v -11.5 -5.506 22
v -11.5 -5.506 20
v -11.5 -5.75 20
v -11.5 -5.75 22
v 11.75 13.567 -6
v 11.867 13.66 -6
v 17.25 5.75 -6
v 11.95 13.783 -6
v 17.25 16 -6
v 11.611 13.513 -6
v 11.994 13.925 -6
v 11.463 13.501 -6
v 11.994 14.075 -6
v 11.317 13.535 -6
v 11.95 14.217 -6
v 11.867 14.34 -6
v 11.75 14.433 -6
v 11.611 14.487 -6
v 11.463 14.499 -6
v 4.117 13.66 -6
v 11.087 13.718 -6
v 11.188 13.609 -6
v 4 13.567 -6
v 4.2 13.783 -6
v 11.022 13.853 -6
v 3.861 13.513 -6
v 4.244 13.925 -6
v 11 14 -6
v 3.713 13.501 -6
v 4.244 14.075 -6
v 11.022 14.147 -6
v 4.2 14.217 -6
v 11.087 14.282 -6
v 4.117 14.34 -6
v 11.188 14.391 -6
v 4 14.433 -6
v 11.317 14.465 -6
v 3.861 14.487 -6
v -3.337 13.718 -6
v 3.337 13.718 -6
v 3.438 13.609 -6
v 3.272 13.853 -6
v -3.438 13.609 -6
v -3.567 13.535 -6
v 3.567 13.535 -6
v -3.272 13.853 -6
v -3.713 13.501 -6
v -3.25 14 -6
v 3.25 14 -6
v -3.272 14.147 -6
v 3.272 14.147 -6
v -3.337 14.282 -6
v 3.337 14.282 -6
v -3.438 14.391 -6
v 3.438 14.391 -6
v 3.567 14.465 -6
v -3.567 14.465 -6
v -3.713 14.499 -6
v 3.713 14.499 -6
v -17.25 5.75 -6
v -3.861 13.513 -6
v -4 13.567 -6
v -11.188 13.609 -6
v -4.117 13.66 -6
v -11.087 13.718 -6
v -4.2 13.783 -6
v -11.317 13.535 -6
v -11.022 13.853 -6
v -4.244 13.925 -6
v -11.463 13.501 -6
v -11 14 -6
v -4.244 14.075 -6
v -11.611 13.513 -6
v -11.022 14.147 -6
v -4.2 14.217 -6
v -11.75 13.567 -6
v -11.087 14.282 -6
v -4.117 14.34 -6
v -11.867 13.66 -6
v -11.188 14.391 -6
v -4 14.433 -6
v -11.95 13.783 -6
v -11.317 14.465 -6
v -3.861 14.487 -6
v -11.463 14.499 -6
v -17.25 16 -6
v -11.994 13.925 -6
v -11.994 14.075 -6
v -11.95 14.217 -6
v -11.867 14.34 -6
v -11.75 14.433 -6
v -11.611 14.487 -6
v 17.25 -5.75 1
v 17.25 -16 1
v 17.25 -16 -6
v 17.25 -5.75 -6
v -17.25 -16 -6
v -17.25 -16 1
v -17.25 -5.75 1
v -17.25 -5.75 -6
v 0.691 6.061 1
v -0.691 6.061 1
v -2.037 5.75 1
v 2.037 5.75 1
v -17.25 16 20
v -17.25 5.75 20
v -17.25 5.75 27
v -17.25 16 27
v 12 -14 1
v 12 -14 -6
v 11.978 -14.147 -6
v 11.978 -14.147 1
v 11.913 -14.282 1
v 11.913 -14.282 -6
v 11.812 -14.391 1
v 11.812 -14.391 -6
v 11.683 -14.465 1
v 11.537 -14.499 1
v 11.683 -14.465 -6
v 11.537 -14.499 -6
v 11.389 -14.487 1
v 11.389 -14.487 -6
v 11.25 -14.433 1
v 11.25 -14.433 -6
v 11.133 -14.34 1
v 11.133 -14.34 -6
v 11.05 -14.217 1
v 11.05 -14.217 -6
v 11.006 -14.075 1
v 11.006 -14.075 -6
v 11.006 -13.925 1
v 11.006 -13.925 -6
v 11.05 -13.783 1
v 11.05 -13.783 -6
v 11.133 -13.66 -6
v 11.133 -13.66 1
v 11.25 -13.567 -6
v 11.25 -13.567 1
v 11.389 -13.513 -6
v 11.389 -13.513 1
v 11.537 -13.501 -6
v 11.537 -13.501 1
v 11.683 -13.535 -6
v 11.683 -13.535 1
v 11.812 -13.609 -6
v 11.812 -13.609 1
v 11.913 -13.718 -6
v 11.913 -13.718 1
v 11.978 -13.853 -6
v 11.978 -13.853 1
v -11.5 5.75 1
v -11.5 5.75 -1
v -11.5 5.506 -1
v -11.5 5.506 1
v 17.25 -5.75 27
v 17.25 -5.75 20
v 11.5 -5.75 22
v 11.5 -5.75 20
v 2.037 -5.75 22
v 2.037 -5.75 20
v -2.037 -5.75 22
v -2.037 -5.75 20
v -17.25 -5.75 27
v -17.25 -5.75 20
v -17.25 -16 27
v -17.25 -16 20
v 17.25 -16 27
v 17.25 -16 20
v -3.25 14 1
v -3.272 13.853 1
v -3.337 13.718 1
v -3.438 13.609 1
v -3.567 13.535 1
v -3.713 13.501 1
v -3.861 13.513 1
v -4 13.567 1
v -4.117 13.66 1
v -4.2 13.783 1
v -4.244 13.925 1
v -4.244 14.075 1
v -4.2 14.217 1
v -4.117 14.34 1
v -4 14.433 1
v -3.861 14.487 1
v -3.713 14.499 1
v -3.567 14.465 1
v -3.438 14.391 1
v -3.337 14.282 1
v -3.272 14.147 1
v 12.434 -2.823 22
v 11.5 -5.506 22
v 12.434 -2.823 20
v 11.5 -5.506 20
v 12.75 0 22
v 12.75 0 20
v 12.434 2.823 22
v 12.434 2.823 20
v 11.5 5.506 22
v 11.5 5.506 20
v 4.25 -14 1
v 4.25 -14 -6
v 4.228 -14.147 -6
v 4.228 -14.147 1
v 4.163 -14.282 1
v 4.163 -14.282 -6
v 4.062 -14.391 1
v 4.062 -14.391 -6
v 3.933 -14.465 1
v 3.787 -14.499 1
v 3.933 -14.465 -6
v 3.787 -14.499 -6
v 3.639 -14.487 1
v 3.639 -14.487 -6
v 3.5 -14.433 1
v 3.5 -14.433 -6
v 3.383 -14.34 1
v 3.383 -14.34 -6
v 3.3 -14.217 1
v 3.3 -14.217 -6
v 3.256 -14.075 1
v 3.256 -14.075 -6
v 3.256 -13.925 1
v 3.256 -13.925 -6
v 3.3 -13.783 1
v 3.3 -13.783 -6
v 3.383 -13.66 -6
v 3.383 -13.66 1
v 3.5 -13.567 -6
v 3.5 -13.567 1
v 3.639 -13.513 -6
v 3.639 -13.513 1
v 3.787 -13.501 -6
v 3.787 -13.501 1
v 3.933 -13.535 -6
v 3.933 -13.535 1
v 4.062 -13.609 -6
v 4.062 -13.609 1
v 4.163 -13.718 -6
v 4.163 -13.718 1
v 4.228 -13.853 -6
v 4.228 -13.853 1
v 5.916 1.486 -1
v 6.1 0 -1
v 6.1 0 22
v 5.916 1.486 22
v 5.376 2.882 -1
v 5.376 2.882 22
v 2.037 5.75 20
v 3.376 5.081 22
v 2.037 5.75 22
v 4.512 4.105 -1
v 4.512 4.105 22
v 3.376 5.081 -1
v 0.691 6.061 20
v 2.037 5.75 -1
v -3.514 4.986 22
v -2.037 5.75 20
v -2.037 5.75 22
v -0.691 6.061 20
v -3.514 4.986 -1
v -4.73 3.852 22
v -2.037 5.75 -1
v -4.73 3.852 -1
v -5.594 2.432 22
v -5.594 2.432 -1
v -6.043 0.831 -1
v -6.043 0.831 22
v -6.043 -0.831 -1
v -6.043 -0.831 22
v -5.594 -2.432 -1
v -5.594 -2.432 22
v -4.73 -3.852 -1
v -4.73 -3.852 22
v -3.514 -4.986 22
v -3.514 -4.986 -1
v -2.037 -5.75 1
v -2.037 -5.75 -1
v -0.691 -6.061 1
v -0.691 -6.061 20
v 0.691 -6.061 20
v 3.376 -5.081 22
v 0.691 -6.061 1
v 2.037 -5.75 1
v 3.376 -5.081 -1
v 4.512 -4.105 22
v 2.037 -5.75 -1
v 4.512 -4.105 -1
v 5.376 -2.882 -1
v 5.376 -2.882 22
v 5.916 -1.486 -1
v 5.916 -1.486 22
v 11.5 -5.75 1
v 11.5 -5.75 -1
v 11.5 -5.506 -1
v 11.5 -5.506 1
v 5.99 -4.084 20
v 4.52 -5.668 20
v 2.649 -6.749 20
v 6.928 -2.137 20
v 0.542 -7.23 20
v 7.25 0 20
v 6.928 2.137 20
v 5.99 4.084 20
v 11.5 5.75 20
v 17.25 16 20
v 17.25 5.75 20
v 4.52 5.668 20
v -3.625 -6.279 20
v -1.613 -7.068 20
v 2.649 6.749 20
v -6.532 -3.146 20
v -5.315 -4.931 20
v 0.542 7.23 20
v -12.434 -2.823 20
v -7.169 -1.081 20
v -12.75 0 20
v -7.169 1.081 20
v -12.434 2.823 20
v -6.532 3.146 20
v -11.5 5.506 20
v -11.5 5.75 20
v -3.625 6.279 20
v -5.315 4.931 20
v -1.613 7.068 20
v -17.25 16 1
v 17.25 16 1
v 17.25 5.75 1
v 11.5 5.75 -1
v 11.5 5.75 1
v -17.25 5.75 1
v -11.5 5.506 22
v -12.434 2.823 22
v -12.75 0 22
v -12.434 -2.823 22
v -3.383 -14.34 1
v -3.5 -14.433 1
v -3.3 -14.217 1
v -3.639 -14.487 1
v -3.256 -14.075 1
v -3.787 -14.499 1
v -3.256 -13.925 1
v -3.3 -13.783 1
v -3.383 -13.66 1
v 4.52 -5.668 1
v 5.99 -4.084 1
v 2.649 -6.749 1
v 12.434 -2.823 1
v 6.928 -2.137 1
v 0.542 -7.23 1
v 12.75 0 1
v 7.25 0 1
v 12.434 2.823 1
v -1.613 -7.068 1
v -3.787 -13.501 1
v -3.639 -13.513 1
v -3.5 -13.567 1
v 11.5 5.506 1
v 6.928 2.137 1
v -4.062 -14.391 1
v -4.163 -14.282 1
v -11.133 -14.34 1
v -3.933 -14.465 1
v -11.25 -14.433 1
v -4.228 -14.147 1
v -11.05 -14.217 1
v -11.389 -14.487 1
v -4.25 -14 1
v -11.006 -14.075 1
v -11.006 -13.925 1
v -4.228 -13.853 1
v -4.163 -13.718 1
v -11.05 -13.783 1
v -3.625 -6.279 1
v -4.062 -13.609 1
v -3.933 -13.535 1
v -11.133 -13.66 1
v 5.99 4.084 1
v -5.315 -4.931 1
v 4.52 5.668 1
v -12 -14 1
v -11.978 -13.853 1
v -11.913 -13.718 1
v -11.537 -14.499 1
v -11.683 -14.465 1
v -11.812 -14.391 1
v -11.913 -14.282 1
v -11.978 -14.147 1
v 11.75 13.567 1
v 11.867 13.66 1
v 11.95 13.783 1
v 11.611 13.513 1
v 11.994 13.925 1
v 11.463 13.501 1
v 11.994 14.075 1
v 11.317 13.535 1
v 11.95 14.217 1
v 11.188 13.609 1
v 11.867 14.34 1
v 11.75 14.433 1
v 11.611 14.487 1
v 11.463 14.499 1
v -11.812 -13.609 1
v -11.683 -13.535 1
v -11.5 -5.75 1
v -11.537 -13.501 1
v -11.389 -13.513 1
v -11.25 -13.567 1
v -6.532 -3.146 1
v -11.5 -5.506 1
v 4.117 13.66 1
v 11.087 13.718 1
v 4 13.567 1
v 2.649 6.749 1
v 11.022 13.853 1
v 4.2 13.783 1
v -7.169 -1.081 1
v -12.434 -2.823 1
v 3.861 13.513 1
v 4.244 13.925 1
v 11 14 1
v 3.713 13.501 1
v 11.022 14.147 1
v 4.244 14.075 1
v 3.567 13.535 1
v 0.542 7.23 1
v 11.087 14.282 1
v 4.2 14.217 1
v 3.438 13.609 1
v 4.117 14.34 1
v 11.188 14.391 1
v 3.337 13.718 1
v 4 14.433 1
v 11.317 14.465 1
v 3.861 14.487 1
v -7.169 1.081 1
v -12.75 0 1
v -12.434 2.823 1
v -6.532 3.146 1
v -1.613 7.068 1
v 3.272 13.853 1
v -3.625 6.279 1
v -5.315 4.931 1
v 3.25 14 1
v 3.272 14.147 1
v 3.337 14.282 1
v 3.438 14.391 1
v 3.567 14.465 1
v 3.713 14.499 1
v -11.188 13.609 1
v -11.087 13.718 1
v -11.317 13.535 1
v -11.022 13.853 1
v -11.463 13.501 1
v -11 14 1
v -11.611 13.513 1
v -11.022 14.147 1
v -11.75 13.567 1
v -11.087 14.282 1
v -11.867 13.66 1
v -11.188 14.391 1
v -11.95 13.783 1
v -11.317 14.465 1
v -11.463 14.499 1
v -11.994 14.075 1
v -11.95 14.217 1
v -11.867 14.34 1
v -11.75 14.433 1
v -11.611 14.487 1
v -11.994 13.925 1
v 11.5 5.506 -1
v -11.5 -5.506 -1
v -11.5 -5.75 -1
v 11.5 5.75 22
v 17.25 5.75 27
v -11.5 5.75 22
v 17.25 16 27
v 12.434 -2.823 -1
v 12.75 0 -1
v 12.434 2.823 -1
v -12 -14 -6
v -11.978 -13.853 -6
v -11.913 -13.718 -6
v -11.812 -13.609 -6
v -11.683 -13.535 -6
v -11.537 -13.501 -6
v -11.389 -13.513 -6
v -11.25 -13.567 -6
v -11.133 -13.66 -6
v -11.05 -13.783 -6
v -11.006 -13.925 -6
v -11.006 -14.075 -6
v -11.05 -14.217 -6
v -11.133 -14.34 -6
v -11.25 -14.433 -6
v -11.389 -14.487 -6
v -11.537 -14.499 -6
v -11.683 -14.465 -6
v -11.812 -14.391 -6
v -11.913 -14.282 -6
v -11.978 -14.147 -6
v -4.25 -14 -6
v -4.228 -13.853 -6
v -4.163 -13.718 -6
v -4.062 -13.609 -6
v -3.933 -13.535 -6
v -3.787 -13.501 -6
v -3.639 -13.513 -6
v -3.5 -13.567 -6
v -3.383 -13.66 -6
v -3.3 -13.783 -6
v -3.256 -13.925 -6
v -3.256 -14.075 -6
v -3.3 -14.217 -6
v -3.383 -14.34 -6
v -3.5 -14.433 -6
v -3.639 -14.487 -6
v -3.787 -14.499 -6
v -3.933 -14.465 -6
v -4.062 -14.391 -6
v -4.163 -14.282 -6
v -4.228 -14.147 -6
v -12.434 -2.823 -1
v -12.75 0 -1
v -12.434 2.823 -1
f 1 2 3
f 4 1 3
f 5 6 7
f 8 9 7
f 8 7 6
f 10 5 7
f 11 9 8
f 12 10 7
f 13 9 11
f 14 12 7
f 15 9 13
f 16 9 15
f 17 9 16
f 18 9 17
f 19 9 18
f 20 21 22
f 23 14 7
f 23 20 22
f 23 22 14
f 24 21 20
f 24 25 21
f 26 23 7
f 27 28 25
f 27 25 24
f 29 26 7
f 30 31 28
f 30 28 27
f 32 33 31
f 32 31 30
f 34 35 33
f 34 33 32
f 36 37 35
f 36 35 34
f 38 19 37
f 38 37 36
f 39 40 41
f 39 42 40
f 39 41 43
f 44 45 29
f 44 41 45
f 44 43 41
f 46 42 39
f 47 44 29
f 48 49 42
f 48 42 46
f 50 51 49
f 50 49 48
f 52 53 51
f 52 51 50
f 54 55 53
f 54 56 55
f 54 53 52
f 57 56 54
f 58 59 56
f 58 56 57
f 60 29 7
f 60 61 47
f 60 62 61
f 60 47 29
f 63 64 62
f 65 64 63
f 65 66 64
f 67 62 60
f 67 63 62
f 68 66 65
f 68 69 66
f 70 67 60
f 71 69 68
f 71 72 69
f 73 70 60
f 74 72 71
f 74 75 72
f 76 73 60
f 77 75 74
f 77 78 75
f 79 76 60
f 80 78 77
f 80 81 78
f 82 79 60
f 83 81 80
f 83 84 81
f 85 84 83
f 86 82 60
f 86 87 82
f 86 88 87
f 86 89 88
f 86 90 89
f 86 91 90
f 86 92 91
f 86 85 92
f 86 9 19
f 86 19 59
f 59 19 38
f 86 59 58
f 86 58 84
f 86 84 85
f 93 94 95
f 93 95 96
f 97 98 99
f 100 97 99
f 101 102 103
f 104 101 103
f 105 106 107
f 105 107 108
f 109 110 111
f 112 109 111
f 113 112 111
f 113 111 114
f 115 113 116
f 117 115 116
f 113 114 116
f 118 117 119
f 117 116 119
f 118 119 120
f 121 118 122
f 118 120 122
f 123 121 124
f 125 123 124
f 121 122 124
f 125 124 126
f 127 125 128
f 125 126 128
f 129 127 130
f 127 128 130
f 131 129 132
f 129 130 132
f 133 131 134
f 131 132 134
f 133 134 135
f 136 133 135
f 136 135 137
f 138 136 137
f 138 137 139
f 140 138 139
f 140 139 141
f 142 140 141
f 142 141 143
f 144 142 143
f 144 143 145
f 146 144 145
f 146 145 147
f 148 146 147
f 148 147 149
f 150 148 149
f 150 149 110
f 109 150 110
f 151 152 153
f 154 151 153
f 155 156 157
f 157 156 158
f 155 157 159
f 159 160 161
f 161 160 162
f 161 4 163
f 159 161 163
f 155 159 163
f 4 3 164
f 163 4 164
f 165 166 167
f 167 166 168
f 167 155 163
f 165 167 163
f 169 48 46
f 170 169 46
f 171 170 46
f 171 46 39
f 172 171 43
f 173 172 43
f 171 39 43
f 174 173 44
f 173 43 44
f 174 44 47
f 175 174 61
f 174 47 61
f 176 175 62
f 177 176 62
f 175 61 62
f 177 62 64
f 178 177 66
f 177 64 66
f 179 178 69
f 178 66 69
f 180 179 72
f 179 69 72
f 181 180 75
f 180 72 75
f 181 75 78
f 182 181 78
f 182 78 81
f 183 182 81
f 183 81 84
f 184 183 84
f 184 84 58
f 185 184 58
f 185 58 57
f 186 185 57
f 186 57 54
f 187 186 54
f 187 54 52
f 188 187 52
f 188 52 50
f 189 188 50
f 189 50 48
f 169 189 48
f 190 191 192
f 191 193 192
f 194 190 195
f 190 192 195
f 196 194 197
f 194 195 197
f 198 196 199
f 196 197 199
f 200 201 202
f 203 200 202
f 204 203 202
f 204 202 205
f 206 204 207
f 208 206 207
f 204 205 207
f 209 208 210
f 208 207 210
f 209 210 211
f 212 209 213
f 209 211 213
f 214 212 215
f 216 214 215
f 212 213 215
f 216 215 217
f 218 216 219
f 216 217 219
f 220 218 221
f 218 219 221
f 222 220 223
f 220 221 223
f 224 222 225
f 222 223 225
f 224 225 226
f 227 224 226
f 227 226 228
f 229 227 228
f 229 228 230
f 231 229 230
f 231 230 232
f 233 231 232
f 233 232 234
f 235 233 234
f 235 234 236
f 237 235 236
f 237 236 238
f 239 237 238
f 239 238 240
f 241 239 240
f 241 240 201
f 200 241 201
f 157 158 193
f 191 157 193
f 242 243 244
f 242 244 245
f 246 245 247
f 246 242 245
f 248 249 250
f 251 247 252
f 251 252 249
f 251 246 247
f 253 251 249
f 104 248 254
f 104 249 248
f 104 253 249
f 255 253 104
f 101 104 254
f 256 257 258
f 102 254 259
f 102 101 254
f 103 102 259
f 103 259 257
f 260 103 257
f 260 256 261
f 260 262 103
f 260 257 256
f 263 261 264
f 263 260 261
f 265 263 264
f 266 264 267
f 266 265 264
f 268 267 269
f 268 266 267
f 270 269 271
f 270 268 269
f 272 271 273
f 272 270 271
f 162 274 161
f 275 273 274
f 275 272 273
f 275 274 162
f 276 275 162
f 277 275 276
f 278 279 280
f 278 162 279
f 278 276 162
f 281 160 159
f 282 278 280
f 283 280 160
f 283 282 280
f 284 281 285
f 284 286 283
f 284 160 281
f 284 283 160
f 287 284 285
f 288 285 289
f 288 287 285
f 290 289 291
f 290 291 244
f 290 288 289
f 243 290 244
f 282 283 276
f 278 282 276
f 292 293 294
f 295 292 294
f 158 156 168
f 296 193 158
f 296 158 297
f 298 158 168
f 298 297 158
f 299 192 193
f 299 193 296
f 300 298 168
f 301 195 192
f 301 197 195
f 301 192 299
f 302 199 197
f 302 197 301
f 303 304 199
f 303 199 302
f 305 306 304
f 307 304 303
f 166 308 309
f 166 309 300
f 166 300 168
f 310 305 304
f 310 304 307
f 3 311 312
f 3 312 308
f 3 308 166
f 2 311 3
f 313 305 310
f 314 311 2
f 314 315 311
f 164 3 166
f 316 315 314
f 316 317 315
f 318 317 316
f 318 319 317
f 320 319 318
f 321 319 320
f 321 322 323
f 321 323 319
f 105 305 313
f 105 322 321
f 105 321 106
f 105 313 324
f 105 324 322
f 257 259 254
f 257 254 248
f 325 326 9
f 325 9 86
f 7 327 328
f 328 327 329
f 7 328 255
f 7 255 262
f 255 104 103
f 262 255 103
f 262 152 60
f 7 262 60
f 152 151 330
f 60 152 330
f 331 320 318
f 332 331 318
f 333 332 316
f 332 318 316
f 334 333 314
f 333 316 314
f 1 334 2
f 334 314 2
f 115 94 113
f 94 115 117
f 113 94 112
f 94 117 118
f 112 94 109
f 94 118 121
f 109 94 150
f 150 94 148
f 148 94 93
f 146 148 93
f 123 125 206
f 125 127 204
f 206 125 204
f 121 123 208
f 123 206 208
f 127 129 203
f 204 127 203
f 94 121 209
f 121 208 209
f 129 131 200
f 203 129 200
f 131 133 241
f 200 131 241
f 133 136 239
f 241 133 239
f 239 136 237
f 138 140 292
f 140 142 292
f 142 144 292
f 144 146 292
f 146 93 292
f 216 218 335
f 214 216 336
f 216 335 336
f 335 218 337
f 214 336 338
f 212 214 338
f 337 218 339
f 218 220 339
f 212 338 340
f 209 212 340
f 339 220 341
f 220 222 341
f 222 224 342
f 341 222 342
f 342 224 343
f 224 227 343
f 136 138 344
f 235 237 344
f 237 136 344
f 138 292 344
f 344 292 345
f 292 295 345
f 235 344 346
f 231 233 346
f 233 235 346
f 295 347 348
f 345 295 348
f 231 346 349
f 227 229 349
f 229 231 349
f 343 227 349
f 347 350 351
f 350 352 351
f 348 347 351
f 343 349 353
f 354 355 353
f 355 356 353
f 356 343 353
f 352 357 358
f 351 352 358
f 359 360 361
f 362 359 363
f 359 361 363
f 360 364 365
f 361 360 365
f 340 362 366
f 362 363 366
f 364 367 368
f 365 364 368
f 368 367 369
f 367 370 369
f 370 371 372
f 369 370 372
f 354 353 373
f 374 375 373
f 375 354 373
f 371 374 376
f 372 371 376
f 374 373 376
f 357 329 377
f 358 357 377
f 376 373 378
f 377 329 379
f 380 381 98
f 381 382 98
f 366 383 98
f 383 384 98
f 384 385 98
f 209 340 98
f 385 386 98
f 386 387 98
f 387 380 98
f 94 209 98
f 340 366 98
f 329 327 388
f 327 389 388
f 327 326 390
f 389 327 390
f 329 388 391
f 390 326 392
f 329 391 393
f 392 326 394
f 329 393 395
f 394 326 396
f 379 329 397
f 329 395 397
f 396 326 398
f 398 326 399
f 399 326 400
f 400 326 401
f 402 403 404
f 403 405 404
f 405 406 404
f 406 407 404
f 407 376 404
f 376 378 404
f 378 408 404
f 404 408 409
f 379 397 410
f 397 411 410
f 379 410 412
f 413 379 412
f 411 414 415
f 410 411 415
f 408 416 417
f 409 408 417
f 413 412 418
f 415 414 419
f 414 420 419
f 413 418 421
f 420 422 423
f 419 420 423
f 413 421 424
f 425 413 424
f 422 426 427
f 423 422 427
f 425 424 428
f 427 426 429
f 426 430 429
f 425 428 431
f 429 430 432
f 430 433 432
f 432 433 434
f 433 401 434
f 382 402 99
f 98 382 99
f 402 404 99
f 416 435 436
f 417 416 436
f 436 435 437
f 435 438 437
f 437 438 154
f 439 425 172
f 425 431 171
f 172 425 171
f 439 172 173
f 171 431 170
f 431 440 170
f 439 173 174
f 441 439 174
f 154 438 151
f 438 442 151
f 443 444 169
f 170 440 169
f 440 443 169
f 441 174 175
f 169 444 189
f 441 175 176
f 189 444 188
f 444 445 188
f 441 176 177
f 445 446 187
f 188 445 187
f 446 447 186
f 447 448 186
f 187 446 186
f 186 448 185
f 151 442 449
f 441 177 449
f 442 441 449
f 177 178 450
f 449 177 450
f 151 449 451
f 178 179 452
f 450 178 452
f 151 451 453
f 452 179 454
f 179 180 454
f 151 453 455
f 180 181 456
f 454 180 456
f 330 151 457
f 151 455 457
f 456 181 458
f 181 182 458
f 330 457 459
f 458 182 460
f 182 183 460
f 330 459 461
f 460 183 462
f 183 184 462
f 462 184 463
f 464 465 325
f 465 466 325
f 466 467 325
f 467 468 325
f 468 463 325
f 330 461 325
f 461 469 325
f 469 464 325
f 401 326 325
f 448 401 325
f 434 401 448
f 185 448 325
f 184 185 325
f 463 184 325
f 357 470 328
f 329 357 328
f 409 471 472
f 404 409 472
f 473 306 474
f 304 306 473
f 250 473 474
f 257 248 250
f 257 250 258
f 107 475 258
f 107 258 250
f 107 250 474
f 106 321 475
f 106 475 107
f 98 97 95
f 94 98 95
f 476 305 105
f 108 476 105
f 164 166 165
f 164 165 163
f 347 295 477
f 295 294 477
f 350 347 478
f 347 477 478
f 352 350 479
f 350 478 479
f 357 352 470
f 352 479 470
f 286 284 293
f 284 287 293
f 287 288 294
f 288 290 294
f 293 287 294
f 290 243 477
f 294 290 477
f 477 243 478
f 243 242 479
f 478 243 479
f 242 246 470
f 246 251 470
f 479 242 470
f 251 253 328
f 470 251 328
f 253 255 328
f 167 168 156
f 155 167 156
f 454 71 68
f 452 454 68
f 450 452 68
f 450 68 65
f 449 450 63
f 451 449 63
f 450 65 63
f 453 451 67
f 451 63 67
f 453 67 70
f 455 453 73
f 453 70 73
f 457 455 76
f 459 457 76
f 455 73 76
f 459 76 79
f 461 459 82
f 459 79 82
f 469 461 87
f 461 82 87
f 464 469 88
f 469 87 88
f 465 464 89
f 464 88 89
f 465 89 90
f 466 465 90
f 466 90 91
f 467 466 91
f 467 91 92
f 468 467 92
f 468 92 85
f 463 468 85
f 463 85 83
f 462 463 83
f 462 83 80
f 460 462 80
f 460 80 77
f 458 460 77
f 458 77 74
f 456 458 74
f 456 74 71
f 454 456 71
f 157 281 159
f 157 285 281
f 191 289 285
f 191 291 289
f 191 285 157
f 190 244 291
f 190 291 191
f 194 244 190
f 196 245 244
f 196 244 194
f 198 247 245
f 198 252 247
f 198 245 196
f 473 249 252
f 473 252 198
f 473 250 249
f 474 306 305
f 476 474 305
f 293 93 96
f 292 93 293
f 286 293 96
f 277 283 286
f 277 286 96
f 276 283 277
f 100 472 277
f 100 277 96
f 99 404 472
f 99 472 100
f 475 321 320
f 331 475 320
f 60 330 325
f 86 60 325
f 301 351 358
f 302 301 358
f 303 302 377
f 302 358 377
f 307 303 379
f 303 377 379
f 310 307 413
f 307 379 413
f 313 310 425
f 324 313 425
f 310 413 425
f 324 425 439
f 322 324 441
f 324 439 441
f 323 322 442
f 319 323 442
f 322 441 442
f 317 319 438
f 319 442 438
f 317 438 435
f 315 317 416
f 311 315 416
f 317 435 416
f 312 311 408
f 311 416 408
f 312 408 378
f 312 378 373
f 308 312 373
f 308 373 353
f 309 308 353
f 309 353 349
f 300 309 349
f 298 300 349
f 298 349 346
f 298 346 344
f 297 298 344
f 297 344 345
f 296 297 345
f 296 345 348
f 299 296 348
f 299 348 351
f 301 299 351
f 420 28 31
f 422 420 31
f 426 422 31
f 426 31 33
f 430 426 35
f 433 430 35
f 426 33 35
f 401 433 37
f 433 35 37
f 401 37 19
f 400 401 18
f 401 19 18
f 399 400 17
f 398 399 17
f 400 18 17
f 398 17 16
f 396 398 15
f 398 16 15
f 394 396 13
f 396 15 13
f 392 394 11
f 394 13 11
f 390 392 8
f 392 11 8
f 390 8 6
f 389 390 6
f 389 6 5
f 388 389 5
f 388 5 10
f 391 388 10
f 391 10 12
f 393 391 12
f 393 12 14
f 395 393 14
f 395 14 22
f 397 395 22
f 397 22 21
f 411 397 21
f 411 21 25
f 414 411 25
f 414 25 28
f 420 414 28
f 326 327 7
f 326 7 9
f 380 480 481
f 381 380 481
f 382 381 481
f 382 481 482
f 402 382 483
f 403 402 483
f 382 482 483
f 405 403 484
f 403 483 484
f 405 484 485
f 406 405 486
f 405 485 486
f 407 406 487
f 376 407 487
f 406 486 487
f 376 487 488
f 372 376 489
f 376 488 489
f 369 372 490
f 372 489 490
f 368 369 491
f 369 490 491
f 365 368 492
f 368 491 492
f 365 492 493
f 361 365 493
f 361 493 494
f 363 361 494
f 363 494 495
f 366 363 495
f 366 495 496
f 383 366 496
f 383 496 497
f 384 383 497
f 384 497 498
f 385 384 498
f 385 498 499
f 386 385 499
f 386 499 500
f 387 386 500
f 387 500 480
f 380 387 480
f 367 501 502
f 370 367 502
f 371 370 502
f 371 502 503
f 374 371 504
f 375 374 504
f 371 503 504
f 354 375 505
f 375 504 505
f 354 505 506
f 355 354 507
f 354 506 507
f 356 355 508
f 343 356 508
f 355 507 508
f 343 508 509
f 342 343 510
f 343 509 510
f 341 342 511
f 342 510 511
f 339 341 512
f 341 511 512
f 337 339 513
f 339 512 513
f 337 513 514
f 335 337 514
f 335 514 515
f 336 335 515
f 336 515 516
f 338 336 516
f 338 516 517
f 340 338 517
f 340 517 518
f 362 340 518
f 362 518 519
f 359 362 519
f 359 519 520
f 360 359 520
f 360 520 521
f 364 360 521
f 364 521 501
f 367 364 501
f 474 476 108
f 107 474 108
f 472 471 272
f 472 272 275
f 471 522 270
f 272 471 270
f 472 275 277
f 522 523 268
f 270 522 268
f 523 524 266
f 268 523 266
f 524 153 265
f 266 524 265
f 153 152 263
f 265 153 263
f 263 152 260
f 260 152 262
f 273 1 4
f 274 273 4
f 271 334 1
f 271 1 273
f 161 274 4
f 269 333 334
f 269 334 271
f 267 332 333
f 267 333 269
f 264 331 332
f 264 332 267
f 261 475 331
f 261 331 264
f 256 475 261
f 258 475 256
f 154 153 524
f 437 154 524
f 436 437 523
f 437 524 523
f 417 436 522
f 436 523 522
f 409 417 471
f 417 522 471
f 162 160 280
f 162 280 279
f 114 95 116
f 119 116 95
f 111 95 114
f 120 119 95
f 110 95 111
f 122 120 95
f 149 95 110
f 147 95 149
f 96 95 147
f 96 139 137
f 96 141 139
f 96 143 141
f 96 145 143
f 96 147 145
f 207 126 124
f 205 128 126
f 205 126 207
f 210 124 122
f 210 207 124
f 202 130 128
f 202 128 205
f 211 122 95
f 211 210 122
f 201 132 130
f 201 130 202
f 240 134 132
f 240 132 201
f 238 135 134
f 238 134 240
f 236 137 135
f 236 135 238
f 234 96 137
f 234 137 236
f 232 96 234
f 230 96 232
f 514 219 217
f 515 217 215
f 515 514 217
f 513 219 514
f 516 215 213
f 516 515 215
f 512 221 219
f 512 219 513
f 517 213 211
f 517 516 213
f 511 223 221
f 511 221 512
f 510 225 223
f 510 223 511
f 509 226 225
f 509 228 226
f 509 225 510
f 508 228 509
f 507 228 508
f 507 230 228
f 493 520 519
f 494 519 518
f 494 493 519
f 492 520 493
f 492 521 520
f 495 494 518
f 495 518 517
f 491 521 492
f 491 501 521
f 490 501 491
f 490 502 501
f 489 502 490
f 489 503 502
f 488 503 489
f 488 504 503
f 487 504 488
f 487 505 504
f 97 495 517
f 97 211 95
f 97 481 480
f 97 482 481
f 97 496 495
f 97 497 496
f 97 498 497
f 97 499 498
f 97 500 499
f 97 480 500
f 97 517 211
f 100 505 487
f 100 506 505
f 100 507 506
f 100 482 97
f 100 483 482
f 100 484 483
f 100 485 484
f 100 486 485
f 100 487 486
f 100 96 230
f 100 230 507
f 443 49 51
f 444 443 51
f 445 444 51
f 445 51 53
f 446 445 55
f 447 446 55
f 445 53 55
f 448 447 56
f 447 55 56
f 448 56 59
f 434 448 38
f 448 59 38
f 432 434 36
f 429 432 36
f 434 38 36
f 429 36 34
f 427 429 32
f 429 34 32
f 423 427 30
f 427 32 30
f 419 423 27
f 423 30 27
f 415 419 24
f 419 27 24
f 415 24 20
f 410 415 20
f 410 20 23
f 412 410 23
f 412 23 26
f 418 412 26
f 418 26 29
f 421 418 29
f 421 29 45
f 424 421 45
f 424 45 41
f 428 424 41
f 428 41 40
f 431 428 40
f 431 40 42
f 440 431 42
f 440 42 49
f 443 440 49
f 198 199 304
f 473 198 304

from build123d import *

# Parameters (mm, degrees)
SKETCH1_R           = 7.25
SKETCH1_R_2         = 6.1
BOSS_EXTRUDE1_DEPTH = 1
SKETCH2_R           = 7.25
SKETCH2_R_2         = 6.1
BOSS_EXTRUDE4_DEPTH = 19
BOSS_EXTRUDE5_START = -2
SKETCH3_W           = 34.5
SKETCH3_H           = 10.25
BOSS_EXTRUDE5_DEPTH = 7
SKETCH4_R           = 0.5
CUT_EXTRUDE1_DEPTH  = 10


with BuildPart() as part:
    # Sketch1 → Boss-Extrude1 (new, symmetric)
    # profile 1 of 2: a face of its own
    with BuildSketch(Plane.XY):
        with BuildLine():
            Line((11.5, -16), (11.5, -5.505678886))
            ThreePointArc((11.5, -5.505678886), (12.75, 0), (11.5, 5.505678886))
            Line((11.5, 5.505678886), (11.5, 16))
            Line((11.5, 16), (-11.5, 16))
            Line((-11.5, 16), (-11.5, 5.505678886))
            ThreePointArc((-11.5, 5.505678886), (-12.75, 0), (-11.5, -5.505678886))
            Line((-11.5, -5.505678886), (-11.5, -16))
            Line((-11.5, -16), (11.5, -16))
        make_face()
        Circle(SKETCH1_R, mode=Mode.SUBTRACT)
    # profile 2 of 2: a face of its own
    with BuildSketch(Plane.XY):
        Circle(SKETCH1_R)
        Circle(SKETCH1_R_2, mode=Mode.SUBTRACT)
    boss_extrude1 = extrude(amount=BOSS_EXTRUDE1_DEPTH, both=True)

    # Sketch2 → Boss-Extrude4 (add)
    with BuildSketch(Plane.XY.offset(1)):
        Circle(SKETCH2_R)
        Circle(SKETCH2_R_2, mode=Mode.SUBTRACT)
    extrude(amount=BOSS_EXTRUDE4_DEPTH)

    # Sketch3 → Boss-Extrude5 (add)
    with BuildSketch(Plane(origin=(0, 0, -1), x_dir=(-1, 0, 0), z_dir=(0, 0, -1)).offset(BOSS_EXTRUDE5_START)):
        with Locations((0, 10.875)):
            Rectangle(SKETCH3_W, SKETCH3_H)
        with Locations((0, -10.875)):
            Rectangle(SKETCH3_W, SKETCH3_H)
    boss_extrude5 = extrude(amount=BOSS_EXTRUDE5_DEPTH)

    # Mirror1: Boss-Extrude1, Boss-Extrude5 across plane
    add(boss_extrude1.mirror(Plane.XY.offset(10.5)))
    add(boss_extrude5.mirror(Plane.XY.offset(10.5)))

    # Sketch4 → Cut-Extrude1 (cut)
    with BuildSketch(Plane(origin=(0, 0, -6), x_dir=(-1, 0, 0), z_dir=(0, 0, -1))):
        with Locations((-11.5, 14)):
            Circle(SKETCH4_R)
        with Locations((-3.75, 14)):
            Circle(SKETCH4_R)
        with Locations(Location((3.75, 14, 0), (0, 0, 180))):
            Circle(SKETCH4_R)
        with Locations(Location((11.5, 14, 0), (0, 0, 180))):
            Circle(SKETCH4_R)
        with Locations((3.75, -14)):
            Circle(SKETCH4_R)
        with Locations(Location((-3.75, -14, 0), (0, 0, 180))):
            Circle(SKETCH4_R)
        with Locations(Location((-11.5, -14, 0), (0, 0, 180))):
            Circle(SKETCH4_R)
        with Locations((11.5, -14)):
            Circle(SKETCH4_R)
    extrude(amount=-CUT_EXTRUDE1_DEPTH, mode=Mode.SUBTRACT)


solid = part.part
